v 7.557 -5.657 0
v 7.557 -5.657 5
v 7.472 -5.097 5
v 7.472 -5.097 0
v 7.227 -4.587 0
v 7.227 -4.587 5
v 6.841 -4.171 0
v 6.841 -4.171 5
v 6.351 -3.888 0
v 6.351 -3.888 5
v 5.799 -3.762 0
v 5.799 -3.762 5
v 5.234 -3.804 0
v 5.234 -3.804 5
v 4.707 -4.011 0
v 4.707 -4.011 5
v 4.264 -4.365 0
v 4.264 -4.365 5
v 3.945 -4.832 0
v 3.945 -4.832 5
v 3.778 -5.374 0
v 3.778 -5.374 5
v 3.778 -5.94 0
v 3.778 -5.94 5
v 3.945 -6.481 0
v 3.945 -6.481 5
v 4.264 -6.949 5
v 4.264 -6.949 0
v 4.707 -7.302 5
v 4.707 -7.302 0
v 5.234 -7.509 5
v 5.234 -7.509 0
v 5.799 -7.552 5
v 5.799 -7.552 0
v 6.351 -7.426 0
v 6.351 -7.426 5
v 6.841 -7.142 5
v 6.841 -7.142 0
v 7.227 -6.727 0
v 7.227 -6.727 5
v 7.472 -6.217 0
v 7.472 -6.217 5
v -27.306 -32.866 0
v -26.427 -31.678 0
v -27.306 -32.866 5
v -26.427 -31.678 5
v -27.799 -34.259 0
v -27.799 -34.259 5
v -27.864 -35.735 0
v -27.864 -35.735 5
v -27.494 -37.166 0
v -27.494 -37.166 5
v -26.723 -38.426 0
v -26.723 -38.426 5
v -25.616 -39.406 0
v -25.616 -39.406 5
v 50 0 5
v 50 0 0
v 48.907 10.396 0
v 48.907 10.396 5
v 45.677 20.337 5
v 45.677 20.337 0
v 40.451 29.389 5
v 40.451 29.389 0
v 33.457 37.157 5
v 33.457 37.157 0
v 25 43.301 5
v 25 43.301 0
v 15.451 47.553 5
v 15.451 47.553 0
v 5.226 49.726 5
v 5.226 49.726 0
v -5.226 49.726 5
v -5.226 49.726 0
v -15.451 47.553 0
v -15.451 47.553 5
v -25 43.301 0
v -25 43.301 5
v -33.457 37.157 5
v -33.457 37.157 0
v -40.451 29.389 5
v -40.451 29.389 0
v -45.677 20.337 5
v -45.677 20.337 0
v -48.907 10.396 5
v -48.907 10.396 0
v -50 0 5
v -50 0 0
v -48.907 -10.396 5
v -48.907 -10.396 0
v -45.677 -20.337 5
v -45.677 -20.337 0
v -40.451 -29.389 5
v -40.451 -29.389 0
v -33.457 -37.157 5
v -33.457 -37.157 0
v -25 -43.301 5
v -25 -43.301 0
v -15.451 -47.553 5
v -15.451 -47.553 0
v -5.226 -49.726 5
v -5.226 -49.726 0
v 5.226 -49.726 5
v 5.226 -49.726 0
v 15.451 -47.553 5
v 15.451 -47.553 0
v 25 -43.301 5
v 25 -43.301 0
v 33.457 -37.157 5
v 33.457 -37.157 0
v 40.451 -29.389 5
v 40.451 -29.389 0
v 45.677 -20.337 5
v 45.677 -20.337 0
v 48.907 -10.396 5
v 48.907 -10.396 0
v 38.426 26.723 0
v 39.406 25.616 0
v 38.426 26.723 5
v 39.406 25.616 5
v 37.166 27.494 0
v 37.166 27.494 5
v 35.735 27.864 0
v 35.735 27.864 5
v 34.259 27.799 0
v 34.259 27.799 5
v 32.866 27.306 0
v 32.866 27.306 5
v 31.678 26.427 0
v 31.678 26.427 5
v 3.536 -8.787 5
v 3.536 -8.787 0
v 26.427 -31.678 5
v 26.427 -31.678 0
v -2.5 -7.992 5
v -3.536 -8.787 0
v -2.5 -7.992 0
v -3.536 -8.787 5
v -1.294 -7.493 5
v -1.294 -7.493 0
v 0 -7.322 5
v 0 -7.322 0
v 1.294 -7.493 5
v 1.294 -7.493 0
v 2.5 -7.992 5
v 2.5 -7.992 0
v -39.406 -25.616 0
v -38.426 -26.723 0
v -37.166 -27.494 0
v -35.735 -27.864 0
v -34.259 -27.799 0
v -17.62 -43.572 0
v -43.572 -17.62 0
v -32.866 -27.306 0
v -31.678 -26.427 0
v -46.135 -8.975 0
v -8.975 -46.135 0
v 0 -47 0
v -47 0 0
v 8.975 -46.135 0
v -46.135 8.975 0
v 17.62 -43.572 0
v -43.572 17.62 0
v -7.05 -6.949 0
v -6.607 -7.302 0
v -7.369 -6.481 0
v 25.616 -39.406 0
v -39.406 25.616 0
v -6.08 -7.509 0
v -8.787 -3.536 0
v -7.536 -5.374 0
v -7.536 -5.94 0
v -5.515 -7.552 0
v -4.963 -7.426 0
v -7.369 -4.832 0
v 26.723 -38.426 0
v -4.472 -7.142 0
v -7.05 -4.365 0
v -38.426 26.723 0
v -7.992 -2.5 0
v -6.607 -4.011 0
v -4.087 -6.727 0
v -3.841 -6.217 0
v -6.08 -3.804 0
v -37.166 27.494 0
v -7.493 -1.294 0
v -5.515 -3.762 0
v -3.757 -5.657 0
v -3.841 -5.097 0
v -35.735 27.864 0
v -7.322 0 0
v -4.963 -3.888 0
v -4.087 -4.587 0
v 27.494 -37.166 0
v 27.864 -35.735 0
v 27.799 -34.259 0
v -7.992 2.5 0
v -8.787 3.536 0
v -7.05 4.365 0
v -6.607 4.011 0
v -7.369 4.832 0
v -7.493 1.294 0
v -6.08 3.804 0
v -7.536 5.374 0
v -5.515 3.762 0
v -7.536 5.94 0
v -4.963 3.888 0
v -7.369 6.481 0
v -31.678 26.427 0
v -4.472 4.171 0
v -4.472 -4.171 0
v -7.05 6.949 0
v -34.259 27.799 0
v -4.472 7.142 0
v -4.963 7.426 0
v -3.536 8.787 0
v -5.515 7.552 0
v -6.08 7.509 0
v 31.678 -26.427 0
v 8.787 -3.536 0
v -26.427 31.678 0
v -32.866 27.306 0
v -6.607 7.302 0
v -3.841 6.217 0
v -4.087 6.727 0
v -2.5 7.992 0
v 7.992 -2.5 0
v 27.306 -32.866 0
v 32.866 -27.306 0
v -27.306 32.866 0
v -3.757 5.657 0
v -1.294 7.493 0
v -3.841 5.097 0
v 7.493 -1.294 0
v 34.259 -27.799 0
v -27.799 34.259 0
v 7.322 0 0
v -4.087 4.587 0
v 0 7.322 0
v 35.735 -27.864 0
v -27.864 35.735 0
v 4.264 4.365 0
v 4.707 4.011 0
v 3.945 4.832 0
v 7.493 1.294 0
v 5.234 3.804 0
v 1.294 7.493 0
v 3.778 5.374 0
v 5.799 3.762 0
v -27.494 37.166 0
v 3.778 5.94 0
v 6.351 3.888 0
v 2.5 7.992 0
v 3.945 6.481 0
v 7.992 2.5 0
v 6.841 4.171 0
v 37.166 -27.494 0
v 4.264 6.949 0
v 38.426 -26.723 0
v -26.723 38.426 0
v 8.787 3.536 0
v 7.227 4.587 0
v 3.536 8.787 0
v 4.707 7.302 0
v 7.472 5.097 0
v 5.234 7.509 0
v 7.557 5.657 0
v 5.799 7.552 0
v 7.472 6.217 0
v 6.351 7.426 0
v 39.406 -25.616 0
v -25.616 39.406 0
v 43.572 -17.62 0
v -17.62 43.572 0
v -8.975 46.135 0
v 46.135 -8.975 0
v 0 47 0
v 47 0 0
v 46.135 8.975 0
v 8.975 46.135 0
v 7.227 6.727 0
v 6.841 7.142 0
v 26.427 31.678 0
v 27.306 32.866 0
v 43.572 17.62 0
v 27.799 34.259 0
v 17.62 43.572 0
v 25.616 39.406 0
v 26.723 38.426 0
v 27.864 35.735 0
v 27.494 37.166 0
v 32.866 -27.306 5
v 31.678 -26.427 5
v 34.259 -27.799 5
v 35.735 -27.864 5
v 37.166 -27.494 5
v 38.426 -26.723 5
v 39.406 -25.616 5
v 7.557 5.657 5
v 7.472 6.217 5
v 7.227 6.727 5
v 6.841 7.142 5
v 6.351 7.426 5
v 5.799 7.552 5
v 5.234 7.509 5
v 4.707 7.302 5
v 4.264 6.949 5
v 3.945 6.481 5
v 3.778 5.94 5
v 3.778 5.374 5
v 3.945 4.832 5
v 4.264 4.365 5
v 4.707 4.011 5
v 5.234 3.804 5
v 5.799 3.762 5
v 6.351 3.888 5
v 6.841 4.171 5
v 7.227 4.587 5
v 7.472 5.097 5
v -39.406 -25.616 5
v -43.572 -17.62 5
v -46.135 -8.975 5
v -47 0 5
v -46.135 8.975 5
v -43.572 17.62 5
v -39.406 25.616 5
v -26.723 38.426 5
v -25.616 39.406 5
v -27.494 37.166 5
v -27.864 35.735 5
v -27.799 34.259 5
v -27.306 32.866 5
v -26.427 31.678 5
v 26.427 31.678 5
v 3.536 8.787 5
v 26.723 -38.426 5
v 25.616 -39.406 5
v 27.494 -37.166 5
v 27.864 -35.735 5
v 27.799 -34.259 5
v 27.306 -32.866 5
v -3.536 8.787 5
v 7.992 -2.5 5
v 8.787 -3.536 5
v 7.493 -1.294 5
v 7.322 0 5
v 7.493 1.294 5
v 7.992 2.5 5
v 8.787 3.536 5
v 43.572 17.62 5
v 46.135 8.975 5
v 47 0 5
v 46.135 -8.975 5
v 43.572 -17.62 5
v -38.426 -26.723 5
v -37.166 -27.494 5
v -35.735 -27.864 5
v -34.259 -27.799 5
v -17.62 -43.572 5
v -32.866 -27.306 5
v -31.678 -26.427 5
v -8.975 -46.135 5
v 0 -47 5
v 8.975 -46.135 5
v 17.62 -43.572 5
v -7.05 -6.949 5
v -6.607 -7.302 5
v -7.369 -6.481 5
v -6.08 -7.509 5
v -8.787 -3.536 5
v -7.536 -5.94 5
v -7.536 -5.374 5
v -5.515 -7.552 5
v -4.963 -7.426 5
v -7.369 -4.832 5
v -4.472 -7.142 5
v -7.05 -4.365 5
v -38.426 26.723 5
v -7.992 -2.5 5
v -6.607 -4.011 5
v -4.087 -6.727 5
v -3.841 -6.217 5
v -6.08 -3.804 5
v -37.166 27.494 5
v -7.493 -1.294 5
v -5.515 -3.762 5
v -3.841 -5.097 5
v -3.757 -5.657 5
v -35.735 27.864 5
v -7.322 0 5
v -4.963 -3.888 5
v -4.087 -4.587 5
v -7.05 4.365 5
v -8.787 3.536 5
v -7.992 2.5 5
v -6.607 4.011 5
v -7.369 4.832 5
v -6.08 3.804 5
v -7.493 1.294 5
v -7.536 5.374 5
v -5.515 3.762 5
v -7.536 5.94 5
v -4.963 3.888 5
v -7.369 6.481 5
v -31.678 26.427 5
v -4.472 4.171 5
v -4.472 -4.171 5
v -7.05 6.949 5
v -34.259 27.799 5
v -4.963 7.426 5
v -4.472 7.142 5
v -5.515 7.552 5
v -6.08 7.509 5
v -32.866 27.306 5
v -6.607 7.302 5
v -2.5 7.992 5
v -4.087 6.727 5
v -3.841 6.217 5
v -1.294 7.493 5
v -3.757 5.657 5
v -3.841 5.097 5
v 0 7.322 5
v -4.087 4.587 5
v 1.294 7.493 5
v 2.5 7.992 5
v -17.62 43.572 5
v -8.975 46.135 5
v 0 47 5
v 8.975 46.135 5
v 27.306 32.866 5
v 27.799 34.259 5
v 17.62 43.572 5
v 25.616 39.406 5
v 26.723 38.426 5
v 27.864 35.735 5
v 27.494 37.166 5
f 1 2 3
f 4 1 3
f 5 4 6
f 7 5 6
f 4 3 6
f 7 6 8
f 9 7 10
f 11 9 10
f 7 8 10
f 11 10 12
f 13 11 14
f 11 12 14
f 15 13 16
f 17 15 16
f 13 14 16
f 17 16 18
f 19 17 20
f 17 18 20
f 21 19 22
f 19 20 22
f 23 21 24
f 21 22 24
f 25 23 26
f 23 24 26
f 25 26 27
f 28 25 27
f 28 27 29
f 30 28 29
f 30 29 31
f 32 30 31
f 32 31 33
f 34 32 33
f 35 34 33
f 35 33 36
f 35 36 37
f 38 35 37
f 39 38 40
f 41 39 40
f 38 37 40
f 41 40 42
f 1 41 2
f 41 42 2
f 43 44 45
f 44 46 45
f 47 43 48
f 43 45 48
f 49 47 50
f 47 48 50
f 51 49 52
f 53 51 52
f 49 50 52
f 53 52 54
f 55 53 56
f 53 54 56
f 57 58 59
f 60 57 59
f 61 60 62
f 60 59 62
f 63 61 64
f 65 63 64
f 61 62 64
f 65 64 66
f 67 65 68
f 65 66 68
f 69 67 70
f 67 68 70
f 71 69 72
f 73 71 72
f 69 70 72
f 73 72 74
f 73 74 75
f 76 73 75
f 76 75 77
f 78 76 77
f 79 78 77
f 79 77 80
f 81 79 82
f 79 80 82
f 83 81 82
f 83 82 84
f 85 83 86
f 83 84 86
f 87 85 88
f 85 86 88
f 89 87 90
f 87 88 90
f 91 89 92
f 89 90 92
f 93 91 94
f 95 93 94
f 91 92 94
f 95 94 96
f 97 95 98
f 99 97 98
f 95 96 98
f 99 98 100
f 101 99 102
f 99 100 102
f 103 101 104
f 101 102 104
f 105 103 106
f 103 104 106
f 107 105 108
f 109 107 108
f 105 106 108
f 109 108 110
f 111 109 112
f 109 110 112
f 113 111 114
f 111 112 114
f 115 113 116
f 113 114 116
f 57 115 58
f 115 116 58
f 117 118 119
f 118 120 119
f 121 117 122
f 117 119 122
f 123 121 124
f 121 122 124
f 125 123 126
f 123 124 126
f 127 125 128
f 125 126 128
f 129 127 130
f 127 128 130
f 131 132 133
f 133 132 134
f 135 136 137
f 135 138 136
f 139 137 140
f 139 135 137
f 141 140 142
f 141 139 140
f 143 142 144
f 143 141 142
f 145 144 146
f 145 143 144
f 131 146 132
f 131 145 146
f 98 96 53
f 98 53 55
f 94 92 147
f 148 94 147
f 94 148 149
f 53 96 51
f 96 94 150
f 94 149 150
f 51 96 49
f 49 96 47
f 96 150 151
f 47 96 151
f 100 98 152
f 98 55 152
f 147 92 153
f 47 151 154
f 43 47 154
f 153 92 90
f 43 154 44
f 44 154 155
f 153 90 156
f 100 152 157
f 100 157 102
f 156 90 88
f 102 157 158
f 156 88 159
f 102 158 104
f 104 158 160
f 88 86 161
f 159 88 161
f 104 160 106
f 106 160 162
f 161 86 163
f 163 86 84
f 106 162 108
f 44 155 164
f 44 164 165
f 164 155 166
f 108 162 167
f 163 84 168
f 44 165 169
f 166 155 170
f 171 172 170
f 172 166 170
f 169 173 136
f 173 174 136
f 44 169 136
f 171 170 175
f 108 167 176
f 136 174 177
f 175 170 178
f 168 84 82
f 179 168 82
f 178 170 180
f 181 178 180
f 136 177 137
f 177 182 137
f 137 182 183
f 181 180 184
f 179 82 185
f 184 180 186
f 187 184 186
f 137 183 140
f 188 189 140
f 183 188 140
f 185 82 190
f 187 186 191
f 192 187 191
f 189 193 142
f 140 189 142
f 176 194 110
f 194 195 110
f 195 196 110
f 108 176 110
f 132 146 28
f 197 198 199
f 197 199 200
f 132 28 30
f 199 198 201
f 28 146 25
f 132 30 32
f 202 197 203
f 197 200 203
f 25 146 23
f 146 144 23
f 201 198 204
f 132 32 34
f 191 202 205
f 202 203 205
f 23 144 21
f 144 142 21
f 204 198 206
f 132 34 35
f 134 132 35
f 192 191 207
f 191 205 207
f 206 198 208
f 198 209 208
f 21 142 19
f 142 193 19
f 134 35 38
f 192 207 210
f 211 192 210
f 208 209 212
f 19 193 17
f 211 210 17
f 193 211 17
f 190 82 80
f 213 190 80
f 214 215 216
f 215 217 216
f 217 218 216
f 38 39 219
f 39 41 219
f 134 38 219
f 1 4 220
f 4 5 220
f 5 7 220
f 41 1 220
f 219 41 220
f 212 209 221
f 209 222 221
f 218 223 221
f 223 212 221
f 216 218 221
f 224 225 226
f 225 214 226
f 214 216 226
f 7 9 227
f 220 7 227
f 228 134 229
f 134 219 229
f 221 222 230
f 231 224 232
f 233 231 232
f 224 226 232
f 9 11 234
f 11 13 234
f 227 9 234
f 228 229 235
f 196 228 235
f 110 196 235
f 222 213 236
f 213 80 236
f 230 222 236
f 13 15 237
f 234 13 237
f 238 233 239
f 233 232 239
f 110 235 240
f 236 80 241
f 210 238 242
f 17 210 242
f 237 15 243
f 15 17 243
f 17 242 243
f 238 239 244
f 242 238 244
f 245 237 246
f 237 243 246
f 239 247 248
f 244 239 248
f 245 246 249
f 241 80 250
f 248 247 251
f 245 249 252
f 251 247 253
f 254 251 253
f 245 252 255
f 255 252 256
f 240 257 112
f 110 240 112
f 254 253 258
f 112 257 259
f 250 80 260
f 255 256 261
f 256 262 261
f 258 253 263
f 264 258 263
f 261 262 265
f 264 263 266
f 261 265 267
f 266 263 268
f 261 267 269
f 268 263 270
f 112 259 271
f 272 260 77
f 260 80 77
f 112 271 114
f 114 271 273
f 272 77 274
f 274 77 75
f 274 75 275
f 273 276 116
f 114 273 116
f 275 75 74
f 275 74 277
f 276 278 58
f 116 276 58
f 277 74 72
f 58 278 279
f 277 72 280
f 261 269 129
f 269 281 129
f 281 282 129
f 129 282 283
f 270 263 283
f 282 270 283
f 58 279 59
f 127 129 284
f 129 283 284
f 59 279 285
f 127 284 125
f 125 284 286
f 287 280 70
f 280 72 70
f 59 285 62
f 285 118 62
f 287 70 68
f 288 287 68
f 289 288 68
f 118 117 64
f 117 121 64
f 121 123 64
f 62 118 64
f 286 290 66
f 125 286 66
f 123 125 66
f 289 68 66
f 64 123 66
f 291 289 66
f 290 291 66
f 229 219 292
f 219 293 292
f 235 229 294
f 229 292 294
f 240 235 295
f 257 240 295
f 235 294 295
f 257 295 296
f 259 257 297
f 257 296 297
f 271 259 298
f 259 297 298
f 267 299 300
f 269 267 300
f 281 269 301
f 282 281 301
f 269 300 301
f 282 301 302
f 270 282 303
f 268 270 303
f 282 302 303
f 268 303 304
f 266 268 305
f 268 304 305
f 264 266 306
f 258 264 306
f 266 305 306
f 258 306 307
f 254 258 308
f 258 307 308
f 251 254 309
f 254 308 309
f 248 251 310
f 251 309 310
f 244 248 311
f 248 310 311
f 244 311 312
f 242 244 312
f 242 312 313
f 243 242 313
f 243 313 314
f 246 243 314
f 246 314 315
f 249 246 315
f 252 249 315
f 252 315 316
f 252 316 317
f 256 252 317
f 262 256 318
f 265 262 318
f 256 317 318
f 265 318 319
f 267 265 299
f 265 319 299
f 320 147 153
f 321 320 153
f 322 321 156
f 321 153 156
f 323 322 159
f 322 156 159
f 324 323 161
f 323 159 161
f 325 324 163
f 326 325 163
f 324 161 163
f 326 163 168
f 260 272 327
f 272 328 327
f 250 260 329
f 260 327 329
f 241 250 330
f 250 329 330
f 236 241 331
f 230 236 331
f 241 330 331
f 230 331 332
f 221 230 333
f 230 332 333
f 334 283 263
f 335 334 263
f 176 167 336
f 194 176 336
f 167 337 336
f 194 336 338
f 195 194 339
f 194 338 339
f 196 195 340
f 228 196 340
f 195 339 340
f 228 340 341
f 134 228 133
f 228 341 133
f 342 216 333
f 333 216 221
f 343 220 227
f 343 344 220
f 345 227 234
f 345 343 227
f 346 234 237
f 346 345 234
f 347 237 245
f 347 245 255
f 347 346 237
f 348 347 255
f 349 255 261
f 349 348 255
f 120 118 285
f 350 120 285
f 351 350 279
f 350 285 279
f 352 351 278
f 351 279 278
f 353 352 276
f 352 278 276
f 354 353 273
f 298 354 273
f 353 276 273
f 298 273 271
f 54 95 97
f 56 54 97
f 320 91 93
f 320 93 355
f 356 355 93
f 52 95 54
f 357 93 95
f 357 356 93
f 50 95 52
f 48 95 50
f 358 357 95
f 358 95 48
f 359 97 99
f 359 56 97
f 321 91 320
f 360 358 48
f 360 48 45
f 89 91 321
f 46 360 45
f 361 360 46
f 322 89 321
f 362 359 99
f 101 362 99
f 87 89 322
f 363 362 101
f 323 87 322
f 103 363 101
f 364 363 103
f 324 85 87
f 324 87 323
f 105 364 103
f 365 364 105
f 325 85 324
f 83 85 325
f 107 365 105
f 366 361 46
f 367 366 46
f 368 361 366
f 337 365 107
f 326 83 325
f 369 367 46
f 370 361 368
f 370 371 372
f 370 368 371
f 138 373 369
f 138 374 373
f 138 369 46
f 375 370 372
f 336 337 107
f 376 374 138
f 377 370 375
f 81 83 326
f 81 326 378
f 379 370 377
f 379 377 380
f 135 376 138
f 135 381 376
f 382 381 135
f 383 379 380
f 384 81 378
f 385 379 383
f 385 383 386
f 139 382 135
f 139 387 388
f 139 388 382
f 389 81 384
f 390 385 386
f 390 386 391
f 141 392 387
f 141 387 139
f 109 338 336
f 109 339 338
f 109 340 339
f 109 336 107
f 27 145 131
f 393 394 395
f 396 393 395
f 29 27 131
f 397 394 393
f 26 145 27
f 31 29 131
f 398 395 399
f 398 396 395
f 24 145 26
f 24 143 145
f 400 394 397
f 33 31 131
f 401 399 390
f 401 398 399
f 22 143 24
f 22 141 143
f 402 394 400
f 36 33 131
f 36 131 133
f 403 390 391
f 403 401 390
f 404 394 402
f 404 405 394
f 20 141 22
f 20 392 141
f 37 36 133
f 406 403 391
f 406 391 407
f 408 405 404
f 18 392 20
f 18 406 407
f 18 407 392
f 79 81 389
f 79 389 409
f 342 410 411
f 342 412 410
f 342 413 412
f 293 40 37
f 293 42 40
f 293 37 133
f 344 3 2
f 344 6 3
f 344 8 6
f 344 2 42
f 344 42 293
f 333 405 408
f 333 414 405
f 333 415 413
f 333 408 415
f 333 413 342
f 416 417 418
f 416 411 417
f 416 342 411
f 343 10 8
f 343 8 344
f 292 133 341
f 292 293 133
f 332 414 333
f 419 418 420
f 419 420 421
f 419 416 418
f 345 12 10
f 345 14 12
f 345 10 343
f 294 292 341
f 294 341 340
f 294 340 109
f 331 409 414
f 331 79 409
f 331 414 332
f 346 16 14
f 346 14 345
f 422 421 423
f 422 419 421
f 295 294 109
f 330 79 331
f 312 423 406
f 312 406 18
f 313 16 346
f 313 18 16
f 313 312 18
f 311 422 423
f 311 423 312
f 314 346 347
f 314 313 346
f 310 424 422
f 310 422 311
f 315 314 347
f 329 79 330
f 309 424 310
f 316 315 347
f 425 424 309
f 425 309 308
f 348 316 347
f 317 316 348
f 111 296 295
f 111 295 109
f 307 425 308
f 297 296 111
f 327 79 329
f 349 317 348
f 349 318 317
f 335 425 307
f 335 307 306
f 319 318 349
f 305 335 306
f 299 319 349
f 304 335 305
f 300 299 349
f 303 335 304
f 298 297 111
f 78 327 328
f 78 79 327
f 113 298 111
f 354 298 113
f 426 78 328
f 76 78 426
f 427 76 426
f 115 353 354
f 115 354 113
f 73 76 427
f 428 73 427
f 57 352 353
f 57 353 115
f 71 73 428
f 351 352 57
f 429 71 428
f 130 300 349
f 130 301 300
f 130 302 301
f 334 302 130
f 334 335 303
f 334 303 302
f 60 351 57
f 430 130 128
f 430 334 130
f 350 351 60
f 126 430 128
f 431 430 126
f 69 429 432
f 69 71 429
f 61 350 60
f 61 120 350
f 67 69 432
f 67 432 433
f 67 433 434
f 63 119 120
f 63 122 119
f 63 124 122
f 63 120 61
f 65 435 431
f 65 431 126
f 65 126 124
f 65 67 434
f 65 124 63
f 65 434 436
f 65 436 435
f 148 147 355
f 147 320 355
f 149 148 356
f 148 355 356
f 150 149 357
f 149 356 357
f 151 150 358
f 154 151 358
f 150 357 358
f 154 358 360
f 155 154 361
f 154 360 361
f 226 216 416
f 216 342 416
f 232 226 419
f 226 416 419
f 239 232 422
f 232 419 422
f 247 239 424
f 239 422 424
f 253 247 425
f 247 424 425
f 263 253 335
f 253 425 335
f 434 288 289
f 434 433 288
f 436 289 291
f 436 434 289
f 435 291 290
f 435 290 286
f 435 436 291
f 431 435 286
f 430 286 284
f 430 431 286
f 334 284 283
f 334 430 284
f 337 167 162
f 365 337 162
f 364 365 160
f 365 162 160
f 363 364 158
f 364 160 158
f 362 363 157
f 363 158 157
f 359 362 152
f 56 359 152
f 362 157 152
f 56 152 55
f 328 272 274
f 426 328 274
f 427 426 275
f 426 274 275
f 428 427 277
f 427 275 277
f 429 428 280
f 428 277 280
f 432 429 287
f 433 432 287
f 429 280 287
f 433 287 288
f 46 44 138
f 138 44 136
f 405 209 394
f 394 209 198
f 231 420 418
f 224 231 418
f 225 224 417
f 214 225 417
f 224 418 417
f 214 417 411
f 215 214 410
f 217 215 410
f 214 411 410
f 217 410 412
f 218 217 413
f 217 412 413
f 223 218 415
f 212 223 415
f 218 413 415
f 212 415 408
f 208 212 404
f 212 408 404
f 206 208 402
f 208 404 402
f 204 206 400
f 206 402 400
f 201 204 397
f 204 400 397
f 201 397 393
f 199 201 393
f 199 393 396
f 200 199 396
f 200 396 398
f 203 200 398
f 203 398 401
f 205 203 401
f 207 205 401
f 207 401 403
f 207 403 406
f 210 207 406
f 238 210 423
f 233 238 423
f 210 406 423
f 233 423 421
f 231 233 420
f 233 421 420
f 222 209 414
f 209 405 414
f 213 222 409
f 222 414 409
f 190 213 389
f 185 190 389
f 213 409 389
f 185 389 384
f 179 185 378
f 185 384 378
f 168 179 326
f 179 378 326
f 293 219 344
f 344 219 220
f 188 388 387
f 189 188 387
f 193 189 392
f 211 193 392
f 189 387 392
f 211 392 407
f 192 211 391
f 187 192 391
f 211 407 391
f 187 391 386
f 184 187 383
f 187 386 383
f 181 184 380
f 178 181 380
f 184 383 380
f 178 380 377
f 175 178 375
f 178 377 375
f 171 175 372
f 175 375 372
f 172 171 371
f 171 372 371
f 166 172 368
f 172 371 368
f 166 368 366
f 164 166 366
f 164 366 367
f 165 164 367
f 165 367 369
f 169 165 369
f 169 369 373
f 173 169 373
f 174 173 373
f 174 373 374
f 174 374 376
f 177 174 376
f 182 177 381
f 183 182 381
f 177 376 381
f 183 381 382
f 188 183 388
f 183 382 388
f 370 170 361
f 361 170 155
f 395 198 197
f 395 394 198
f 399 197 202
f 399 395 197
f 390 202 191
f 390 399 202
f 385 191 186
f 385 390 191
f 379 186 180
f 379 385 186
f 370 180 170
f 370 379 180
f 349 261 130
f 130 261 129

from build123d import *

# Parameters (mm, degrees)
SKETCH1_R           = 50
BOSS_EXTRUDE1_DEPTH = 5
FILLET1_R           = 5
SKETCH2_R           = 1.9
CUT_EXTRUDE1_DEPTH  = 5


with BuildPart() as part:
    # Sketch1 → Boss-Extrude1 (new body)
    with BuildSketch(Plane.XY):
        Circle(SKETCH1_R)
        with BuildLine():
            Line((30.504506916, 35.755769574), (0, 5.251262658))
            Line((0, 5.251262658), (-30.504506916, 35.755769574))
            ThreePointArc((-30.504506916, 35.755769574), (0, 47), (30.504506916, 35.755769574))
        make_face(mode=Mode.SUBTRACT)
        with BuildLine():
            Line((5.251262658, 0), (35.755769574, 30.504506916))
            ThreePointArc((35.755769574, 30.504506916), (47, 0), (35.755769574, -30.504506916))
            Line((35.755769574, -30.504506916), (5.251262658, 0))
        make_face(mode=Mode.SUBTRACT)
        with BuildLine():
            Line((0, -5.251262658), (30.504506916, -35.755769574))
            ThreePointArc((30.504506916, -35.755769574), (0, -47), (-30.504506916, -35.755769574))
            Line((-30.504506916, -35.755769574), (0, -5.251262658))
        make_face(mode=Mode.SUBTRACT)
        with BuildLine():
            Line((-5.251262658, 0), (-35.755769574, -30.504506916))
            ThreePointArc((-35.755769574, -30.504506916), (-47, 0), (-35.755769574, 30.504506916))
            Line((-35.755769574, 30.504506916), (-5.251262658, 0))
        make_face(mode=Mode.SUBTRACT)
    extrude(amount=BOSS_EXTRUDE1_DEPTH)

    # Fillet1
    fillet1_edges = [part.edges().sort_by_distance(p)[0] for p in [
        (-5.251262658, 0, 2.5),
        (-35.755769574, 30.504506916, 2.5),
        (-35.755769574, -30.504506916, 2.5),
        (35.755769574, -30.504506916, 2.5),
        (35.755769574, 30.504506916, 2.5),
        (5.251262658, 0, 2.5),
        (-30.504506916, -35.755769574, 2.5),
        (30.504506916, -35.755769574, 2.5),
        (0, -5.251262658, 2.5),
        (30.504506916, 35.755769574, 2.5),
        (-30.504506916, 35.755769574, 2.5),
        (0, 5.251262658, 2.5),
    ]]
    fillet(fillet1_edges, radius=FILLET1_R)

    # Sketch2 → Cut-Extrude1 (cut)
    with BuildSketch(Plane.XY.offset(5)):
        with Locations((5.656854249, -5.656854249)):
            Circle(SKETCH2_R)
        with Locations((5.656854249, 5.656854249)):
            Circle(SKETCH2_R)
        with Locations((-5.656854249, 5.656854249)):
            Circle(SKETCH2_R)
        with Locations((-5.656854249, -5.656854249)):
            Circle(SKETCH2_R)
    extrude(amount=-CUT_EXTRUDE1_DEPTH, mode=Mode.SUBTRACT)


solid = part.part
